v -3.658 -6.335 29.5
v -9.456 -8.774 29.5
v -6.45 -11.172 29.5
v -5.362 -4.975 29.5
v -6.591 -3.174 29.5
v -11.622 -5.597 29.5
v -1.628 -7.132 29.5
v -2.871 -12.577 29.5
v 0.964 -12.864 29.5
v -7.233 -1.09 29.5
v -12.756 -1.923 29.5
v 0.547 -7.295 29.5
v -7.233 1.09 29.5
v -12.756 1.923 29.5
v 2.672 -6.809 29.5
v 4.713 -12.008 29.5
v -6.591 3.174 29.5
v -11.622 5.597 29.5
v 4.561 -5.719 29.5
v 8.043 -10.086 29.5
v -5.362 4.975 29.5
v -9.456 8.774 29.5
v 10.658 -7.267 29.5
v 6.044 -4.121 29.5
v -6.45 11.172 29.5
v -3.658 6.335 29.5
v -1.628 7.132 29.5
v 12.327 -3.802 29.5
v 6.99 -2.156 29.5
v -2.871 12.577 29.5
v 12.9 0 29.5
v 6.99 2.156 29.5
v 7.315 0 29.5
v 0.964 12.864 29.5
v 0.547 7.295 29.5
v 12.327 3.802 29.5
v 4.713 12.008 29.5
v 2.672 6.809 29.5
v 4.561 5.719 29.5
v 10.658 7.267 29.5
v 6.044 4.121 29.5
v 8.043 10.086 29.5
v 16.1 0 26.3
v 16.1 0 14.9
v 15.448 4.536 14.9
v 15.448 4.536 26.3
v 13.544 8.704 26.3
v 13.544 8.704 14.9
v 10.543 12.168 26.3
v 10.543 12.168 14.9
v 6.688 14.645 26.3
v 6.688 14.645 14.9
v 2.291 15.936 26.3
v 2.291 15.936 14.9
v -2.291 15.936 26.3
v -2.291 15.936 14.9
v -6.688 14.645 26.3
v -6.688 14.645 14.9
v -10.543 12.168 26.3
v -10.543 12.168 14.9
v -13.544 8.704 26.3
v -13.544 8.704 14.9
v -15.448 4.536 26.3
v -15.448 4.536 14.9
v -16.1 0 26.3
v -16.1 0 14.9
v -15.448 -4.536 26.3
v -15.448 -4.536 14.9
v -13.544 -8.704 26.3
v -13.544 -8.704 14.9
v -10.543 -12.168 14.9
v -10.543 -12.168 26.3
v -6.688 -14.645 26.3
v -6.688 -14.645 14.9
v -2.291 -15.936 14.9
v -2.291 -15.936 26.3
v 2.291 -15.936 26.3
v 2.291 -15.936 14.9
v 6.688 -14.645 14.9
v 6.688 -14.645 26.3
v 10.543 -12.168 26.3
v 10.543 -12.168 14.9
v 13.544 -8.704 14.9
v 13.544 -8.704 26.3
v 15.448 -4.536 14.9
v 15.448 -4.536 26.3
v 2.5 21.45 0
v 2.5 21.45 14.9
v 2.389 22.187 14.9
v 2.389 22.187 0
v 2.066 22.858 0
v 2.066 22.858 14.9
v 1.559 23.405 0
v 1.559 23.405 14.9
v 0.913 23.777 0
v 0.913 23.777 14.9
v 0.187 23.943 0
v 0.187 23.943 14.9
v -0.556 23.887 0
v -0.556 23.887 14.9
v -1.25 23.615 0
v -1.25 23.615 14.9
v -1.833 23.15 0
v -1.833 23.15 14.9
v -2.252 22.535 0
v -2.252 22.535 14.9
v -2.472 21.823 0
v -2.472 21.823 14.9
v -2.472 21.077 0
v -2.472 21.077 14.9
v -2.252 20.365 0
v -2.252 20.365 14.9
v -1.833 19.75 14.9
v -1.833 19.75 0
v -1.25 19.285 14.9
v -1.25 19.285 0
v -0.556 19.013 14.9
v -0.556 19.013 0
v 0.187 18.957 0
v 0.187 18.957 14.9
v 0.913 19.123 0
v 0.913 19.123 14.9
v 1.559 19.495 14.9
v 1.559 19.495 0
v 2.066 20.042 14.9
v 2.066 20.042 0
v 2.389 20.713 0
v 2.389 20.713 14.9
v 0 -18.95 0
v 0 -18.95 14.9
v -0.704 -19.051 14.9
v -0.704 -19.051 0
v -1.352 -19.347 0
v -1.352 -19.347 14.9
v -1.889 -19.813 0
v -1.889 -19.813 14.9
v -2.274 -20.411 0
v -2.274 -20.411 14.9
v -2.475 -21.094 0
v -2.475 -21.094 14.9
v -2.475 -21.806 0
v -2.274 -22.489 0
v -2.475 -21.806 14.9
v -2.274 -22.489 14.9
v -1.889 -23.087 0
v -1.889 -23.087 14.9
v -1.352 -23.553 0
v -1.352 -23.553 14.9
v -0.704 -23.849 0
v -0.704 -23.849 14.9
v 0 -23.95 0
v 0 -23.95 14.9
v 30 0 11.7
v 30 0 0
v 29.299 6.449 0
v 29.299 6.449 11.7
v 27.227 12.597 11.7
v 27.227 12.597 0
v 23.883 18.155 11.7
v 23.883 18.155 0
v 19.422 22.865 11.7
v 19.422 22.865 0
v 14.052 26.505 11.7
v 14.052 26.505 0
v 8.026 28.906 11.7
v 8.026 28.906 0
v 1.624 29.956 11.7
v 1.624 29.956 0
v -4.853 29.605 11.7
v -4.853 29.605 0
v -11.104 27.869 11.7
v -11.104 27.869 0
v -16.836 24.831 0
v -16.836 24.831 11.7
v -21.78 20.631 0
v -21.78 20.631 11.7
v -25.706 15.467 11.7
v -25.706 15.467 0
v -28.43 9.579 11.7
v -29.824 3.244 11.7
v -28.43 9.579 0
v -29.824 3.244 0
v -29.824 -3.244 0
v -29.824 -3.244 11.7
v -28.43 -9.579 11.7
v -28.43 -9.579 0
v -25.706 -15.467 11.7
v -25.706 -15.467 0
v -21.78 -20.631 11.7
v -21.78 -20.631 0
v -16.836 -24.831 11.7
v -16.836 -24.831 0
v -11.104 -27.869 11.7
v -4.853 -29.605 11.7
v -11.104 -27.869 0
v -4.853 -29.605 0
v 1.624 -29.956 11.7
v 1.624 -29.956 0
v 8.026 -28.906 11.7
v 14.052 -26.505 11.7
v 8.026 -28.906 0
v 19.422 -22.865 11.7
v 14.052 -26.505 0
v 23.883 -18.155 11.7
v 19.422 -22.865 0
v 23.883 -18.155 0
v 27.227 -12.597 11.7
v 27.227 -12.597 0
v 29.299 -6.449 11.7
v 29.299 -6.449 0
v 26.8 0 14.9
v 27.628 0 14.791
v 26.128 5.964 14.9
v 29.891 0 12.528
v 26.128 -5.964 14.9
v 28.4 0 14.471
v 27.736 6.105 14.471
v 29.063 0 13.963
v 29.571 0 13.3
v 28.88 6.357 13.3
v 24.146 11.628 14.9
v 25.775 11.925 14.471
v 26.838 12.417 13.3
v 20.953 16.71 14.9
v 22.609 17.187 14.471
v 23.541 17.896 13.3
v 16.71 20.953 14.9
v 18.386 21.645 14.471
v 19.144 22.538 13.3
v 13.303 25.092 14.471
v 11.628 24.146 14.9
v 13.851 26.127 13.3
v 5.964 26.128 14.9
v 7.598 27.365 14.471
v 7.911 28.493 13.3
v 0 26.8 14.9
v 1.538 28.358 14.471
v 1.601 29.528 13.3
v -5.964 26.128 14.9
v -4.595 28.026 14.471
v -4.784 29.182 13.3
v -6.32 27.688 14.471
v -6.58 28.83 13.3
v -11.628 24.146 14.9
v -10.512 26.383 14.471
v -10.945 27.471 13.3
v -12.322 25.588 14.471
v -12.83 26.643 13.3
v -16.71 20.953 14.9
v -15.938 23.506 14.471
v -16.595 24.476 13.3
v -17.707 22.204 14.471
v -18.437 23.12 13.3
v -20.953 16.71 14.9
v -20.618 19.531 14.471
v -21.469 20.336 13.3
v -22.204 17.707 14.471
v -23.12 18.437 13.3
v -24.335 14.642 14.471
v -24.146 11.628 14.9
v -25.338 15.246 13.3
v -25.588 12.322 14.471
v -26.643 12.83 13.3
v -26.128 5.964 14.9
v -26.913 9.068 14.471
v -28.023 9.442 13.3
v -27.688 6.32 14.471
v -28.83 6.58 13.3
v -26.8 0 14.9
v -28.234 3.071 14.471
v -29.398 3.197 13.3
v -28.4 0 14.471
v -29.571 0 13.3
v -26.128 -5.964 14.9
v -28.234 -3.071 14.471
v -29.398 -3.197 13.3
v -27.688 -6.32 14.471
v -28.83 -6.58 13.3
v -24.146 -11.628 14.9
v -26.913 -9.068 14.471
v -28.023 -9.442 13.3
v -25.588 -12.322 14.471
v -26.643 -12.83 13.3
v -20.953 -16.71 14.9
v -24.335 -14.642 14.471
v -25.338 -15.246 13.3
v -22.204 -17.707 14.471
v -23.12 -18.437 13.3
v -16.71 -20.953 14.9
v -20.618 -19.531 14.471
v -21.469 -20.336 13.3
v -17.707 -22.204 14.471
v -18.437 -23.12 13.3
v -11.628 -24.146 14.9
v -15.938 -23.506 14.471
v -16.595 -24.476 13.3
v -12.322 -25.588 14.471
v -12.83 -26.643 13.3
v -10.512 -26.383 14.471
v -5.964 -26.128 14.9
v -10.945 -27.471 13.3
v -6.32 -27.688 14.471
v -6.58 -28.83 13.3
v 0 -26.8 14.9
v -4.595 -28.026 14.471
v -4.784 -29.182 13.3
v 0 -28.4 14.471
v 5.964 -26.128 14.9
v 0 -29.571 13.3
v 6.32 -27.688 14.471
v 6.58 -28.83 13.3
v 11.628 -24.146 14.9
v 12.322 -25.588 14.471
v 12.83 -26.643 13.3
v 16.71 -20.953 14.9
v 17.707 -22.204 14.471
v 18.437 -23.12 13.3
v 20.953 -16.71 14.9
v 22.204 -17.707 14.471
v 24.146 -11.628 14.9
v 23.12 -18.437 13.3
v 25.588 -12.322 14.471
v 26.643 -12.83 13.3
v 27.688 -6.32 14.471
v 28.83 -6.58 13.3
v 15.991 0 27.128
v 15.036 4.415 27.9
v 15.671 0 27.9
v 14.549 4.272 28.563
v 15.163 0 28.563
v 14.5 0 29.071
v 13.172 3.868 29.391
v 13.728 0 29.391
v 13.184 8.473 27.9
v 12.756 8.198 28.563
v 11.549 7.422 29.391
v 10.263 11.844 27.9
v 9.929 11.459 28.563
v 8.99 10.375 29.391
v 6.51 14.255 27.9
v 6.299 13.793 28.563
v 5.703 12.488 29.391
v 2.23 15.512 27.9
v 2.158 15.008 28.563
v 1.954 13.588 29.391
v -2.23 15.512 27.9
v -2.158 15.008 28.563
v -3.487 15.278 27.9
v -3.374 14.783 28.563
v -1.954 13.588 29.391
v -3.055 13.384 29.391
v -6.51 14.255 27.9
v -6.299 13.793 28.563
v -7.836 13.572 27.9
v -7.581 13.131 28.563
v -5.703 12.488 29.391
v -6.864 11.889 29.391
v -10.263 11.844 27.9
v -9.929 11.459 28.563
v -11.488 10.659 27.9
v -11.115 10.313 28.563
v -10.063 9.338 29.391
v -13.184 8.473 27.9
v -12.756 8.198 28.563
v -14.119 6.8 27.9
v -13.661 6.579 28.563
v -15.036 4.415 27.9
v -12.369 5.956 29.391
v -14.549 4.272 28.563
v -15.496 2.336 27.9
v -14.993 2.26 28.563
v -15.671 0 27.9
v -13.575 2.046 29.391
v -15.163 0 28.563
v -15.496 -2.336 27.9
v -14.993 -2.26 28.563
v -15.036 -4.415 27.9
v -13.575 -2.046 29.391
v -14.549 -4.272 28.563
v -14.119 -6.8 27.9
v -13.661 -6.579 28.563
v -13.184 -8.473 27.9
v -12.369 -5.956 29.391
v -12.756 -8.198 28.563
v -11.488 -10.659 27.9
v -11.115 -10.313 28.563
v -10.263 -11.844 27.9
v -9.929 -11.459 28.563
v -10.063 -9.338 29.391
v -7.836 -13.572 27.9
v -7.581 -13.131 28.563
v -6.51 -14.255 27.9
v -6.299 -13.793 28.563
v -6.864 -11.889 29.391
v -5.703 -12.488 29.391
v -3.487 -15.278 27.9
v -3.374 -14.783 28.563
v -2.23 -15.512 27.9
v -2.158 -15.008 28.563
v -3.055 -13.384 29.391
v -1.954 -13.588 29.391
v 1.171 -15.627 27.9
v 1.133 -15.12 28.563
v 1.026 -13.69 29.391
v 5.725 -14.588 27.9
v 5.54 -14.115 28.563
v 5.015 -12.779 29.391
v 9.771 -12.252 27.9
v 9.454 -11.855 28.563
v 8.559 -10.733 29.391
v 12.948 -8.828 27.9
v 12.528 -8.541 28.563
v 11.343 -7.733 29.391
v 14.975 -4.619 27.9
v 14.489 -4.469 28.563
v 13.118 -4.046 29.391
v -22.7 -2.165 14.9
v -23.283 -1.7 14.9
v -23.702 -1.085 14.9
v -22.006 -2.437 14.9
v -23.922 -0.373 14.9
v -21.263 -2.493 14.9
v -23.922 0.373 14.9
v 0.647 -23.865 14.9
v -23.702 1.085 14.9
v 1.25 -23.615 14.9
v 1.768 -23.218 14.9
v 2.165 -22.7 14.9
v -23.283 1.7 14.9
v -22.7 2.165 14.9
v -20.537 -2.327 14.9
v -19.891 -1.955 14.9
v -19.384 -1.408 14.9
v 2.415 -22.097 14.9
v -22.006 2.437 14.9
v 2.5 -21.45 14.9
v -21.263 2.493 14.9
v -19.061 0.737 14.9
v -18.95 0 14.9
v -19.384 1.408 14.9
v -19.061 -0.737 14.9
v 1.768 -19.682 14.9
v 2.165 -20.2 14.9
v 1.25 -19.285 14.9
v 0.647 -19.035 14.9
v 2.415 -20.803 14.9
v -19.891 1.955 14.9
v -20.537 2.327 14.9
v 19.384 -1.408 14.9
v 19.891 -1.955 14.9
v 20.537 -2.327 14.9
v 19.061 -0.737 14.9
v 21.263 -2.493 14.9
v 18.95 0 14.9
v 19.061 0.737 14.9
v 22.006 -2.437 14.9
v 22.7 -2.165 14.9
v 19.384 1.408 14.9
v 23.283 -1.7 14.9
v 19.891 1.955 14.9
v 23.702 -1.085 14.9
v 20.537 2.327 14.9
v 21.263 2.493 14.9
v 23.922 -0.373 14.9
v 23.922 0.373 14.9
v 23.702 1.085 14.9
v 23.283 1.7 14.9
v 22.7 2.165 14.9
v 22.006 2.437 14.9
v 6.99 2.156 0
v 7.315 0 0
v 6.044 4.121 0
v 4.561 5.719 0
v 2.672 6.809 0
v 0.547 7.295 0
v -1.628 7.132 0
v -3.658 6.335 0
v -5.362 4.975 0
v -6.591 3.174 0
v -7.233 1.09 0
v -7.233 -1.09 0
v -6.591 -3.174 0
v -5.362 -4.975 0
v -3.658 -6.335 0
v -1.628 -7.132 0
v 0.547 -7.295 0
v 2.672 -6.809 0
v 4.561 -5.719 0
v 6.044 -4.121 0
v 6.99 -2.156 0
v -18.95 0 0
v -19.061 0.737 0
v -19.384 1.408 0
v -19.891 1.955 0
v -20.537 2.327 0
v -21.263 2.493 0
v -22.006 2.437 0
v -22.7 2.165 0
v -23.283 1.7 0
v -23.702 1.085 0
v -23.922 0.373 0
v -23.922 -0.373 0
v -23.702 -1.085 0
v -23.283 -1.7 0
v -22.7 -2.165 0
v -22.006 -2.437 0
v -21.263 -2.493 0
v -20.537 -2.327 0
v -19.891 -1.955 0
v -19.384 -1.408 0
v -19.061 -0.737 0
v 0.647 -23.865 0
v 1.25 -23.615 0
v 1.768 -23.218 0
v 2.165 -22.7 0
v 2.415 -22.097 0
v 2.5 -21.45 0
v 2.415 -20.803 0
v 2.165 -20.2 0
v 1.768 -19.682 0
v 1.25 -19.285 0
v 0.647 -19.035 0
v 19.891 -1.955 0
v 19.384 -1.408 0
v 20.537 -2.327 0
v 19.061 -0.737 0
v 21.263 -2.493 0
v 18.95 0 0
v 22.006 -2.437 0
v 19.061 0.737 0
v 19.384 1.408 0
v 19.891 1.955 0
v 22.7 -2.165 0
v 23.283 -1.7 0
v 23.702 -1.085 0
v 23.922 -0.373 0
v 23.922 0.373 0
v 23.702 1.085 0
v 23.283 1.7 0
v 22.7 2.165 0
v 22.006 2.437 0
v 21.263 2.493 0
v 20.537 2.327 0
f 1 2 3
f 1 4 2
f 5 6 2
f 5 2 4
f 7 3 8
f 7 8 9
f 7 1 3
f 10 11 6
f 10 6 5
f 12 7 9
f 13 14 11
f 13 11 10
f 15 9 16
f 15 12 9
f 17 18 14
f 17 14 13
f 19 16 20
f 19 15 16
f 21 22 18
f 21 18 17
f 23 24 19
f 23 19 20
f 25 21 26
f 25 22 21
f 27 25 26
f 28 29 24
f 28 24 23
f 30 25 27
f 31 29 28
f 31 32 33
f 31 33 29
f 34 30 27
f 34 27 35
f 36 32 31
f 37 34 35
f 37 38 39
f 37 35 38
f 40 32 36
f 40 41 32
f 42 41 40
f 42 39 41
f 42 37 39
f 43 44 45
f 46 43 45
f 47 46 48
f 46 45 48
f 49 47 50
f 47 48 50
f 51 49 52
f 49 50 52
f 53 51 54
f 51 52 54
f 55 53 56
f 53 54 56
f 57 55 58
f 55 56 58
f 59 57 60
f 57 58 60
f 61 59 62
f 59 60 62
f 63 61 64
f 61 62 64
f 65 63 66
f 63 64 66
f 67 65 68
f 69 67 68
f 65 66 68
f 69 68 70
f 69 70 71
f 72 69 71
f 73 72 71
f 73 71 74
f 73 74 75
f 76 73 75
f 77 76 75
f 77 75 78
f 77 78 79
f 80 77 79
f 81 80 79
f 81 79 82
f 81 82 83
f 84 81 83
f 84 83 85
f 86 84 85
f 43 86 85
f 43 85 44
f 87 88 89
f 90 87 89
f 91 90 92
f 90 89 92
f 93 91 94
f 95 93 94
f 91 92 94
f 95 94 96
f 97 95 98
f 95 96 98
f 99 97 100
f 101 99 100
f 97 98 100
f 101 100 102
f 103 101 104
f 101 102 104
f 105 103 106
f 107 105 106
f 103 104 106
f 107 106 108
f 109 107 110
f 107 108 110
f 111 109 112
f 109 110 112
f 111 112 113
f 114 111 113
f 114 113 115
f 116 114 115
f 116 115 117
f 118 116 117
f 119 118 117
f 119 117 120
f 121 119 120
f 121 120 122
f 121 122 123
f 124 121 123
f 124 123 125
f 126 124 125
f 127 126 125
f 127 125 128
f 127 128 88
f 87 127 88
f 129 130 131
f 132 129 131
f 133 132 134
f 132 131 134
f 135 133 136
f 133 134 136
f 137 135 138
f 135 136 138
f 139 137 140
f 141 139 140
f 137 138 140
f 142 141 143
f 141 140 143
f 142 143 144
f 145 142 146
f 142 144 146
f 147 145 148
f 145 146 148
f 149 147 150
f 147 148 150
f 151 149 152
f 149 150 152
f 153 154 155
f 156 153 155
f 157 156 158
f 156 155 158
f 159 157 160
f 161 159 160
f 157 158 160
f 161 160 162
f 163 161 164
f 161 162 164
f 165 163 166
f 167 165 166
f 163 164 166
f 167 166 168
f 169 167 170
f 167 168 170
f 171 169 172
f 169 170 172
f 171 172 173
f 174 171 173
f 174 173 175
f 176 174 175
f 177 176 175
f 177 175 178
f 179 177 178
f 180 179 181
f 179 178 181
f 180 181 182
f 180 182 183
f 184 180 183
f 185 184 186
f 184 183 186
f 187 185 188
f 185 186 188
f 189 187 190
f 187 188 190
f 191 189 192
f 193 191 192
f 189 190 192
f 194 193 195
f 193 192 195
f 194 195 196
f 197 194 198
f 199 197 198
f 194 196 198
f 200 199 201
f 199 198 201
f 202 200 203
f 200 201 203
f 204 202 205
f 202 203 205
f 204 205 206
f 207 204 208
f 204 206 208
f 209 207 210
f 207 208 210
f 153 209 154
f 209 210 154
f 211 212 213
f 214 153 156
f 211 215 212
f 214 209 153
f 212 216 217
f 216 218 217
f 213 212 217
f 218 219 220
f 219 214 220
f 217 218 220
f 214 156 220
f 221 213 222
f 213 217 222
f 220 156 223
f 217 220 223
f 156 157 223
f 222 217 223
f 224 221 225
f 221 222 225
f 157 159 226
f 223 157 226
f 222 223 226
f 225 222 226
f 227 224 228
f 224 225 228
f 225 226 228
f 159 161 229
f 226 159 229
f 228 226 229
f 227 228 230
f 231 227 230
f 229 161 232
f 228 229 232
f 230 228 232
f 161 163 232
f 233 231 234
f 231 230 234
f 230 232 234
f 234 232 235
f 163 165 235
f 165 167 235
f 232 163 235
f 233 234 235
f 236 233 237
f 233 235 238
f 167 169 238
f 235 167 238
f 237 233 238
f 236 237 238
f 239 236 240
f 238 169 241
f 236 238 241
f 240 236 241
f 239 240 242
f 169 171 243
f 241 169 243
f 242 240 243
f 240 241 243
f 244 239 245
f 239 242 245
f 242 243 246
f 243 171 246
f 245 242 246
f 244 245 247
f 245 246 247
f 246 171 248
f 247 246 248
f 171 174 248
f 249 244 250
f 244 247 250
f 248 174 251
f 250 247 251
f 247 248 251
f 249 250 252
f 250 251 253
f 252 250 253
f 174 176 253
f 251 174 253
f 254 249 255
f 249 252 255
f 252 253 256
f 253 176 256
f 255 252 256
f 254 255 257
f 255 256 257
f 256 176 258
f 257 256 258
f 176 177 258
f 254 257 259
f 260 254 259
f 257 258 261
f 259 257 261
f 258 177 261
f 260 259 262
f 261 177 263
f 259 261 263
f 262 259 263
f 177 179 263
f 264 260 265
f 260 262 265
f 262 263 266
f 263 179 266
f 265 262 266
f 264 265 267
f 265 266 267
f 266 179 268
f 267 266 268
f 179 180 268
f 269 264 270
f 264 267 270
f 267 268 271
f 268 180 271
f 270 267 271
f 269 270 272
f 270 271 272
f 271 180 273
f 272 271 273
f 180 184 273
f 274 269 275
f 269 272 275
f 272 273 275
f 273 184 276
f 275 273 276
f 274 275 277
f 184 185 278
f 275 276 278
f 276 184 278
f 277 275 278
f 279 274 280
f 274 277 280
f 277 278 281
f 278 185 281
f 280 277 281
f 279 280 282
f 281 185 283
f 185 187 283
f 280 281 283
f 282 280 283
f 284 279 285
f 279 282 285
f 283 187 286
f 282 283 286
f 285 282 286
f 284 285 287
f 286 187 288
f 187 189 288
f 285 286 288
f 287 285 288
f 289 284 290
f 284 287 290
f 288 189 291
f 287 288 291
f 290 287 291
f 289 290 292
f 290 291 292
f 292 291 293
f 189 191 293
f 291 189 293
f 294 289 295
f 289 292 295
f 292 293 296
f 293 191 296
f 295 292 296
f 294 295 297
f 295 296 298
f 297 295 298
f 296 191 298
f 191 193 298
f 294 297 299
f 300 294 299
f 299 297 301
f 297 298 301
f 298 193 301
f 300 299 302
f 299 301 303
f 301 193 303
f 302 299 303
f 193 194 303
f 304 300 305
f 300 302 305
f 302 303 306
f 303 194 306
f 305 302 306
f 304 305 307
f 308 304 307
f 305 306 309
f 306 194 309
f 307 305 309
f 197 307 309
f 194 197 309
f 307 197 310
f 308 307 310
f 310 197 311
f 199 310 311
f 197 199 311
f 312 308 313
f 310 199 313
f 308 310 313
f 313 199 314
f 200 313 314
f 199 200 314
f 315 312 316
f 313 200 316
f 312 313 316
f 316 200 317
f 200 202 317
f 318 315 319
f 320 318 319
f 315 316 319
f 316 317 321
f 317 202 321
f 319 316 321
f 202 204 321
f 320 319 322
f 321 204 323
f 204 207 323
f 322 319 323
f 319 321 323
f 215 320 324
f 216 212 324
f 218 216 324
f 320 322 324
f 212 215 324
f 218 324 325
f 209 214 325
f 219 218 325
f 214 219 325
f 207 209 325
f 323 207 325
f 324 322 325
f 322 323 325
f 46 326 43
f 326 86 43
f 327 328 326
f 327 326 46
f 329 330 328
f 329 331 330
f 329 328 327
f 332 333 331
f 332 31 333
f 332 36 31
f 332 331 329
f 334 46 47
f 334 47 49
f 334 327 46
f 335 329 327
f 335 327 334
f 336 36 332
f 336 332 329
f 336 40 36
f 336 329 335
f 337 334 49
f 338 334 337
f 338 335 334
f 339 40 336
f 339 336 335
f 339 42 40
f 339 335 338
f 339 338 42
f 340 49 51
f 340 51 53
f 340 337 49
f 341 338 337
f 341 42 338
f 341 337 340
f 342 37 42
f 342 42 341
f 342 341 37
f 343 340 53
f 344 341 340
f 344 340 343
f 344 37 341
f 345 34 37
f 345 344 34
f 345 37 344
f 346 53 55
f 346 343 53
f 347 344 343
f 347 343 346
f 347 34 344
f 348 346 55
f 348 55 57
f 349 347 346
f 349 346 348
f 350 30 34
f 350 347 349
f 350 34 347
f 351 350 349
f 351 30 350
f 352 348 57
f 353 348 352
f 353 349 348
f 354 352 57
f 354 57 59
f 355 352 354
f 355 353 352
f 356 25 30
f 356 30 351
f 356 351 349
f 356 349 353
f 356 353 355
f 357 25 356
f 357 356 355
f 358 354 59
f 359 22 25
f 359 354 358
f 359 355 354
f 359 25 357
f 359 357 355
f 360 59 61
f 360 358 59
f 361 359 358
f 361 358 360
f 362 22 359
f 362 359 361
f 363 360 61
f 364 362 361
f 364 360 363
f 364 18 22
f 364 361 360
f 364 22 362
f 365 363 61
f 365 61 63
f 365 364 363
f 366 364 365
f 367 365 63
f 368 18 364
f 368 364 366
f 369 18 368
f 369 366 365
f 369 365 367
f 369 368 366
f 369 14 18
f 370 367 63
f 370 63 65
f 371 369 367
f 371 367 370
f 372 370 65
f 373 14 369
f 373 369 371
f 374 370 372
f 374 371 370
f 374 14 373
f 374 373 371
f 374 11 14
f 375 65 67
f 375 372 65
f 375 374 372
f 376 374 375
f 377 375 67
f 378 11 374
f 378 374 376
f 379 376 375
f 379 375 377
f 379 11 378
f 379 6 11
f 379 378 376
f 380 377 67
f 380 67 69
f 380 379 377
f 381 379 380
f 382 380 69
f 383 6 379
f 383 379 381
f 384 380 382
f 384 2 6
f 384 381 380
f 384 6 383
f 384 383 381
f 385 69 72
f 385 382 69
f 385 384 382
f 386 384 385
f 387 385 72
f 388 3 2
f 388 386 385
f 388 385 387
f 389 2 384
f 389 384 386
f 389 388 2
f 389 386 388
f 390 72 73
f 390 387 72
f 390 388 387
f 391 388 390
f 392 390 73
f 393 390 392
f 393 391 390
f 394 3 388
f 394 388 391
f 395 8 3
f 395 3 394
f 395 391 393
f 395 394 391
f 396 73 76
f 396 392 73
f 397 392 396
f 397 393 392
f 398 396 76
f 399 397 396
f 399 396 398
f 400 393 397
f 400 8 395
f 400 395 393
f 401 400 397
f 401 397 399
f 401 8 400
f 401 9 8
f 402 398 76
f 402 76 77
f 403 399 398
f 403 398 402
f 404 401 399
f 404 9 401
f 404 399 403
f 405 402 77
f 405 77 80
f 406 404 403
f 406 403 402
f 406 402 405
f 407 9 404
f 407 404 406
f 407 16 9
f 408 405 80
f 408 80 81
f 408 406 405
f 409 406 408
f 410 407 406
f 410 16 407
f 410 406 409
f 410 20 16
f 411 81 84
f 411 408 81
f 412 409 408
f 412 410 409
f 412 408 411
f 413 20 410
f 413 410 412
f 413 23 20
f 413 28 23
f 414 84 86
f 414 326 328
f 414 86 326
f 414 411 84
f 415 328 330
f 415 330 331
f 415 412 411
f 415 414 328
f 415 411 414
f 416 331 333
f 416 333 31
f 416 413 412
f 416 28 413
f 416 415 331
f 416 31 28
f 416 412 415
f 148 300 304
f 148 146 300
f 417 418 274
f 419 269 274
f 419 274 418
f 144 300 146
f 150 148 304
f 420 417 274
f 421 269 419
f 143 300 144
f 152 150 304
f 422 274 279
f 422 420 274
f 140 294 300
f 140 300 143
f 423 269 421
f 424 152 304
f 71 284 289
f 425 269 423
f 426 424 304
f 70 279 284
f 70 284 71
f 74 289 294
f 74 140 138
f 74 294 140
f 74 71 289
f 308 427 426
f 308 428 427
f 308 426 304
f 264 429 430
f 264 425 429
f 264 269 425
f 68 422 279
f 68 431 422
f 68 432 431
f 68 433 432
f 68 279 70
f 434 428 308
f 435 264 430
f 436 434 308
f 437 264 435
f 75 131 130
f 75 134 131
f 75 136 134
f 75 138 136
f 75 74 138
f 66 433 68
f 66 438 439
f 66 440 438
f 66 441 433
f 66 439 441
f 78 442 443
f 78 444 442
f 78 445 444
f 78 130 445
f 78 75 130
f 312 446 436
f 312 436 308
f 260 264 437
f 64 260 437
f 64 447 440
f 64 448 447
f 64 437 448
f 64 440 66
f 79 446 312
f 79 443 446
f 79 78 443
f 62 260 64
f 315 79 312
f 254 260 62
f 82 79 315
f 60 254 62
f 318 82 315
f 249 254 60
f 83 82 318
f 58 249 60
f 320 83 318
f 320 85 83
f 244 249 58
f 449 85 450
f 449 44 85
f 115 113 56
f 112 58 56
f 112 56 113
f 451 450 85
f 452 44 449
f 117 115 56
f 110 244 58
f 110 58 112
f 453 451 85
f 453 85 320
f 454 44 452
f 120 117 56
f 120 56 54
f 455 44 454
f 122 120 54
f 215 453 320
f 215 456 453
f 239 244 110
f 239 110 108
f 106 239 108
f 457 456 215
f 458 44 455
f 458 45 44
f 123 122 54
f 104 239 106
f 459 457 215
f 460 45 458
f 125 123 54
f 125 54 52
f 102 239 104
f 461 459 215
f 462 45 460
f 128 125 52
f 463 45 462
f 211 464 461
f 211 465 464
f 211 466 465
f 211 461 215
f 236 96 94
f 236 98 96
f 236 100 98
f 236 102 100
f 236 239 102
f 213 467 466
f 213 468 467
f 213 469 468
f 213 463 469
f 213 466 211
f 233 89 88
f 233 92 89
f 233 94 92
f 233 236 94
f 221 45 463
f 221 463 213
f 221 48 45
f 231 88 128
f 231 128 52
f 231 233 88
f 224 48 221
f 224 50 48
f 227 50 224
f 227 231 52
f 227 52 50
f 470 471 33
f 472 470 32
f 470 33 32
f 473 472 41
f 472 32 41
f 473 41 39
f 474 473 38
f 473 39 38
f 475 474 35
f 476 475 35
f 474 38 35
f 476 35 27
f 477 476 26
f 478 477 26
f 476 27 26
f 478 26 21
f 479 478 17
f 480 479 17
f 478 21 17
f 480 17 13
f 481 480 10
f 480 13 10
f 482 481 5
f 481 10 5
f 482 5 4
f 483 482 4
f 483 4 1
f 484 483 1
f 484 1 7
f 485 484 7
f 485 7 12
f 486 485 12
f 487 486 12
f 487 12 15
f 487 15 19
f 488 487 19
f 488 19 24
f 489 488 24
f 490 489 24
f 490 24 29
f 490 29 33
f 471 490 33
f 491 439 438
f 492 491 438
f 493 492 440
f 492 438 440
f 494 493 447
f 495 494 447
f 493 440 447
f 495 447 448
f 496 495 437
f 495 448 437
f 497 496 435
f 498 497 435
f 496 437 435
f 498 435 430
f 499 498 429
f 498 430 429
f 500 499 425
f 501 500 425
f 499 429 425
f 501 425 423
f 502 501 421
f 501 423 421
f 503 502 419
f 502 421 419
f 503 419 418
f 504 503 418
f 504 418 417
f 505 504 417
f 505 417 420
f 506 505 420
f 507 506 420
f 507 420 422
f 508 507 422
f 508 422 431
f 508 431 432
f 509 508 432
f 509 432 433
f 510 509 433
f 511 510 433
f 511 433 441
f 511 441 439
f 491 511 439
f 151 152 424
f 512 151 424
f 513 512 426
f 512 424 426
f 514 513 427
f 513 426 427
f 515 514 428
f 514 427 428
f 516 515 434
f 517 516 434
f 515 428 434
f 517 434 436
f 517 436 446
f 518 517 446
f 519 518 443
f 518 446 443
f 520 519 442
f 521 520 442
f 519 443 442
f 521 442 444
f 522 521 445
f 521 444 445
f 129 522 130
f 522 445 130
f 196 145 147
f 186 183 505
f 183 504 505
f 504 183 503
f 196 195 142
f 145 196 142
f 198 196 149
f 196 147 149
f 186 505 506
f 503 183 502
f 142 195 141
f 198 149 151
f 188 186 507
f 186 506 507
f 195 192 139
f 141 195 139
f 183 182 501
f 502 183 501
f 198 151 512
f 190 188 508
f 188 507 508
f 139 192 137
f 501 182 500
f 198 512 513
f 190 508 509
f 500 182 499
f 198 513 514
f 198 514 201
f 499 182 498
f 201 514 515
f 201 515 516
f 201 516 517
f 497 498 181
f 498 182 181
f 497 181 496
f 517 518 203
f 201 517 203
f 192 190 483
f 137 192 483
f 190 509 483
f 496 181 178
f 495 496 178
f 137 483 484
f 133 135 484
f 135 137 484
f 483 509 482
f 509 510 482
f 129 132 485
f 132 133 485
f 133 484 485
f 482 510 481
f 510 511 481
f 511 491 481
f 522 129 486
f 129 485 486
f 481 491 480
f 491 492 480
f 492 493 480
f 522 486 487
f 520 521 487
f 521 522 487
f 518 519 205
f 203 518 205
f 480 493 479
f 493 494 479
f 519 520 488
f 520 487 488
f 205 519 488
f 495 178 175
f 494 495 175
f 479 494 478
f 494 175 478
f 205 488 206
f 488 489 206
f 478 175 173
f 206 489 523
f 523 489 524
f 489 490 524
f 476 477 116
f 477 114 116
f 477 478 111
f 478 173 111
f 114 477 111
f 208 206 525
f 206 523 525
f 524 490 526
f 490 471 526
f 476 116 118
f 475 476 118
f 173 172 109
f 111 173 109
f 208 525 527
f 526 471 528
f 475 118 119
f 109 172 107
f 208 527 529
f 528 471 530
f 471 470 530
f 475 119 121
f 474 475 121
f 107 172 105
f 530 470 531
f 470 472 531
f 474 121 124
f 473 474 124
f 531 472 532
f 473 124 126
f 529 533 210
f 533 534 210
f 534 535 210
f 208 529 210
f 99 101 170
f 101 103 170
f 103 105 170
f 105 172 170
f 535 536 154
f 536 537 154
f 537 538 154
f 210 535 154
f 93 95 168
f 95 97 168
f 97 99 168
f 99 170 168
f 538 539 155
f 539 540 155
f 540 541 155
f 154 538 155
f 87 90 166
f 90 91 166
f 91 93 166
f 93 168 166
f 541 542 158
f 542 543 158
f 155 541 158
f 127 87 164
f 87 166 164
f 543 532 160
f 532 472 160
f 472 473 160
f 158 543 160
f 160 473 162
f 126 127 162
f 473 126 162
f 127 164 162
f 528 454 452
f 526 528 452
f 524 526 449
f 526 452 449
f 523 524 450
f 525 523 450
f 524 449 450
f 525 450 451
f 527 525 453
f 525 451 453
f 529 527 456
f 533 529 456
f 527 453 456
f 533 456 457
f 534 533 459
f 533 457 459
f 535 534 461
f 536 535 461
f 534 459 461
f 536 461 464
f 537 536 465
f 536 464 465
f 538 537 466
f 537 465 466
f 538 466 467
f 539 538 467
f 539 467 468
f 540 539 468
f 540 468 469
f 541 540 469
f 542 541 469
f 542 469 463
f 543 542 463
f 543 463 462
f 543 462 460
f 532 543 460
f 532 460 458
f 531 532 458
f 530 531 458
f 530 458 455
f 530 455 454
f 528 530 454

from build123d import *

# Parameters (mm, degrees)
F0_R     = 30
F0_R_2   = 16.1
F1_DEPTH = 14.9
F2_DEPTH = 29.5
F3_R     = 3.2
F4_R     = 3.2
F5_R     = 2.5
F6_DEPTH = 100
F7_R     = 7.315
F8_DEPTH = 100


with BuildPart() as f1:
    # F0 (on Top) → F1 (new body)
    with BuildSketch(Plane.XY):
        Circle(F0_R)
        Circle(F0_R_2, mode=Mode.SUBTRACT)
    extrude(amount=F1_DEPTH)

    # F0 (on Top) → F2 (join)
    with BuildSketch(Plane.XY):
        Circle(F0_R_2)
    extrude(amount=F2_DEPTH)

    # F3
    f3_edges = [f1.edges().sort_by_distance(p)[0] for p in [
        (-30, 0, 14.9),
    ]]
    fillet(f3_edges, radius=F3_R)

    # F4
    f4_edges = [f1.edges().sort_by_distance(p)[0] for p in [
        (-16.1, 0, 29.5),
    ]]
    fillet(f4_edges, radius=F4_R)

    # F5 (on face) → F6 (cut)
    with BuildSketch(Plane.XY.offset(14.9)):
        with Locations((0, 21.45)):
            Circle(F5_R)
        with BuildLine():
            ThreePointArc((23.95, 0), (21.45, 2.5), (18.95, 0))
            ThreePointArc((18.95, 0), (21.45, -2.5), (23.95, 0))
        make_face()
        with BuildLine():
            ThreePointArc((2.5, -21.45), (1.767766953, -19.682233047), (0, -18.95))
            ThreePointArc((0, -18.95), (-2.5, -21.45), (0, -23.95))
            ThreePointArc((0, -23.95), (1.767766953, -23.217766953), (2.5, -21.45))
        make_face()
        with Locations((-21.45, 0)):
            Circle(F5_R)
    extrude(amount=-F6_DEPTH, mode=Mode.SUBTRACT)

    # F7 (on face) → F8 (cut)
    with BuildSketch(Plane.XY.offset(29.5)):
        Circle(F7_R)
    extrude(amount=-F8_DEPTH, mode=Mode.SUBTRACT)


solid = f1.part
